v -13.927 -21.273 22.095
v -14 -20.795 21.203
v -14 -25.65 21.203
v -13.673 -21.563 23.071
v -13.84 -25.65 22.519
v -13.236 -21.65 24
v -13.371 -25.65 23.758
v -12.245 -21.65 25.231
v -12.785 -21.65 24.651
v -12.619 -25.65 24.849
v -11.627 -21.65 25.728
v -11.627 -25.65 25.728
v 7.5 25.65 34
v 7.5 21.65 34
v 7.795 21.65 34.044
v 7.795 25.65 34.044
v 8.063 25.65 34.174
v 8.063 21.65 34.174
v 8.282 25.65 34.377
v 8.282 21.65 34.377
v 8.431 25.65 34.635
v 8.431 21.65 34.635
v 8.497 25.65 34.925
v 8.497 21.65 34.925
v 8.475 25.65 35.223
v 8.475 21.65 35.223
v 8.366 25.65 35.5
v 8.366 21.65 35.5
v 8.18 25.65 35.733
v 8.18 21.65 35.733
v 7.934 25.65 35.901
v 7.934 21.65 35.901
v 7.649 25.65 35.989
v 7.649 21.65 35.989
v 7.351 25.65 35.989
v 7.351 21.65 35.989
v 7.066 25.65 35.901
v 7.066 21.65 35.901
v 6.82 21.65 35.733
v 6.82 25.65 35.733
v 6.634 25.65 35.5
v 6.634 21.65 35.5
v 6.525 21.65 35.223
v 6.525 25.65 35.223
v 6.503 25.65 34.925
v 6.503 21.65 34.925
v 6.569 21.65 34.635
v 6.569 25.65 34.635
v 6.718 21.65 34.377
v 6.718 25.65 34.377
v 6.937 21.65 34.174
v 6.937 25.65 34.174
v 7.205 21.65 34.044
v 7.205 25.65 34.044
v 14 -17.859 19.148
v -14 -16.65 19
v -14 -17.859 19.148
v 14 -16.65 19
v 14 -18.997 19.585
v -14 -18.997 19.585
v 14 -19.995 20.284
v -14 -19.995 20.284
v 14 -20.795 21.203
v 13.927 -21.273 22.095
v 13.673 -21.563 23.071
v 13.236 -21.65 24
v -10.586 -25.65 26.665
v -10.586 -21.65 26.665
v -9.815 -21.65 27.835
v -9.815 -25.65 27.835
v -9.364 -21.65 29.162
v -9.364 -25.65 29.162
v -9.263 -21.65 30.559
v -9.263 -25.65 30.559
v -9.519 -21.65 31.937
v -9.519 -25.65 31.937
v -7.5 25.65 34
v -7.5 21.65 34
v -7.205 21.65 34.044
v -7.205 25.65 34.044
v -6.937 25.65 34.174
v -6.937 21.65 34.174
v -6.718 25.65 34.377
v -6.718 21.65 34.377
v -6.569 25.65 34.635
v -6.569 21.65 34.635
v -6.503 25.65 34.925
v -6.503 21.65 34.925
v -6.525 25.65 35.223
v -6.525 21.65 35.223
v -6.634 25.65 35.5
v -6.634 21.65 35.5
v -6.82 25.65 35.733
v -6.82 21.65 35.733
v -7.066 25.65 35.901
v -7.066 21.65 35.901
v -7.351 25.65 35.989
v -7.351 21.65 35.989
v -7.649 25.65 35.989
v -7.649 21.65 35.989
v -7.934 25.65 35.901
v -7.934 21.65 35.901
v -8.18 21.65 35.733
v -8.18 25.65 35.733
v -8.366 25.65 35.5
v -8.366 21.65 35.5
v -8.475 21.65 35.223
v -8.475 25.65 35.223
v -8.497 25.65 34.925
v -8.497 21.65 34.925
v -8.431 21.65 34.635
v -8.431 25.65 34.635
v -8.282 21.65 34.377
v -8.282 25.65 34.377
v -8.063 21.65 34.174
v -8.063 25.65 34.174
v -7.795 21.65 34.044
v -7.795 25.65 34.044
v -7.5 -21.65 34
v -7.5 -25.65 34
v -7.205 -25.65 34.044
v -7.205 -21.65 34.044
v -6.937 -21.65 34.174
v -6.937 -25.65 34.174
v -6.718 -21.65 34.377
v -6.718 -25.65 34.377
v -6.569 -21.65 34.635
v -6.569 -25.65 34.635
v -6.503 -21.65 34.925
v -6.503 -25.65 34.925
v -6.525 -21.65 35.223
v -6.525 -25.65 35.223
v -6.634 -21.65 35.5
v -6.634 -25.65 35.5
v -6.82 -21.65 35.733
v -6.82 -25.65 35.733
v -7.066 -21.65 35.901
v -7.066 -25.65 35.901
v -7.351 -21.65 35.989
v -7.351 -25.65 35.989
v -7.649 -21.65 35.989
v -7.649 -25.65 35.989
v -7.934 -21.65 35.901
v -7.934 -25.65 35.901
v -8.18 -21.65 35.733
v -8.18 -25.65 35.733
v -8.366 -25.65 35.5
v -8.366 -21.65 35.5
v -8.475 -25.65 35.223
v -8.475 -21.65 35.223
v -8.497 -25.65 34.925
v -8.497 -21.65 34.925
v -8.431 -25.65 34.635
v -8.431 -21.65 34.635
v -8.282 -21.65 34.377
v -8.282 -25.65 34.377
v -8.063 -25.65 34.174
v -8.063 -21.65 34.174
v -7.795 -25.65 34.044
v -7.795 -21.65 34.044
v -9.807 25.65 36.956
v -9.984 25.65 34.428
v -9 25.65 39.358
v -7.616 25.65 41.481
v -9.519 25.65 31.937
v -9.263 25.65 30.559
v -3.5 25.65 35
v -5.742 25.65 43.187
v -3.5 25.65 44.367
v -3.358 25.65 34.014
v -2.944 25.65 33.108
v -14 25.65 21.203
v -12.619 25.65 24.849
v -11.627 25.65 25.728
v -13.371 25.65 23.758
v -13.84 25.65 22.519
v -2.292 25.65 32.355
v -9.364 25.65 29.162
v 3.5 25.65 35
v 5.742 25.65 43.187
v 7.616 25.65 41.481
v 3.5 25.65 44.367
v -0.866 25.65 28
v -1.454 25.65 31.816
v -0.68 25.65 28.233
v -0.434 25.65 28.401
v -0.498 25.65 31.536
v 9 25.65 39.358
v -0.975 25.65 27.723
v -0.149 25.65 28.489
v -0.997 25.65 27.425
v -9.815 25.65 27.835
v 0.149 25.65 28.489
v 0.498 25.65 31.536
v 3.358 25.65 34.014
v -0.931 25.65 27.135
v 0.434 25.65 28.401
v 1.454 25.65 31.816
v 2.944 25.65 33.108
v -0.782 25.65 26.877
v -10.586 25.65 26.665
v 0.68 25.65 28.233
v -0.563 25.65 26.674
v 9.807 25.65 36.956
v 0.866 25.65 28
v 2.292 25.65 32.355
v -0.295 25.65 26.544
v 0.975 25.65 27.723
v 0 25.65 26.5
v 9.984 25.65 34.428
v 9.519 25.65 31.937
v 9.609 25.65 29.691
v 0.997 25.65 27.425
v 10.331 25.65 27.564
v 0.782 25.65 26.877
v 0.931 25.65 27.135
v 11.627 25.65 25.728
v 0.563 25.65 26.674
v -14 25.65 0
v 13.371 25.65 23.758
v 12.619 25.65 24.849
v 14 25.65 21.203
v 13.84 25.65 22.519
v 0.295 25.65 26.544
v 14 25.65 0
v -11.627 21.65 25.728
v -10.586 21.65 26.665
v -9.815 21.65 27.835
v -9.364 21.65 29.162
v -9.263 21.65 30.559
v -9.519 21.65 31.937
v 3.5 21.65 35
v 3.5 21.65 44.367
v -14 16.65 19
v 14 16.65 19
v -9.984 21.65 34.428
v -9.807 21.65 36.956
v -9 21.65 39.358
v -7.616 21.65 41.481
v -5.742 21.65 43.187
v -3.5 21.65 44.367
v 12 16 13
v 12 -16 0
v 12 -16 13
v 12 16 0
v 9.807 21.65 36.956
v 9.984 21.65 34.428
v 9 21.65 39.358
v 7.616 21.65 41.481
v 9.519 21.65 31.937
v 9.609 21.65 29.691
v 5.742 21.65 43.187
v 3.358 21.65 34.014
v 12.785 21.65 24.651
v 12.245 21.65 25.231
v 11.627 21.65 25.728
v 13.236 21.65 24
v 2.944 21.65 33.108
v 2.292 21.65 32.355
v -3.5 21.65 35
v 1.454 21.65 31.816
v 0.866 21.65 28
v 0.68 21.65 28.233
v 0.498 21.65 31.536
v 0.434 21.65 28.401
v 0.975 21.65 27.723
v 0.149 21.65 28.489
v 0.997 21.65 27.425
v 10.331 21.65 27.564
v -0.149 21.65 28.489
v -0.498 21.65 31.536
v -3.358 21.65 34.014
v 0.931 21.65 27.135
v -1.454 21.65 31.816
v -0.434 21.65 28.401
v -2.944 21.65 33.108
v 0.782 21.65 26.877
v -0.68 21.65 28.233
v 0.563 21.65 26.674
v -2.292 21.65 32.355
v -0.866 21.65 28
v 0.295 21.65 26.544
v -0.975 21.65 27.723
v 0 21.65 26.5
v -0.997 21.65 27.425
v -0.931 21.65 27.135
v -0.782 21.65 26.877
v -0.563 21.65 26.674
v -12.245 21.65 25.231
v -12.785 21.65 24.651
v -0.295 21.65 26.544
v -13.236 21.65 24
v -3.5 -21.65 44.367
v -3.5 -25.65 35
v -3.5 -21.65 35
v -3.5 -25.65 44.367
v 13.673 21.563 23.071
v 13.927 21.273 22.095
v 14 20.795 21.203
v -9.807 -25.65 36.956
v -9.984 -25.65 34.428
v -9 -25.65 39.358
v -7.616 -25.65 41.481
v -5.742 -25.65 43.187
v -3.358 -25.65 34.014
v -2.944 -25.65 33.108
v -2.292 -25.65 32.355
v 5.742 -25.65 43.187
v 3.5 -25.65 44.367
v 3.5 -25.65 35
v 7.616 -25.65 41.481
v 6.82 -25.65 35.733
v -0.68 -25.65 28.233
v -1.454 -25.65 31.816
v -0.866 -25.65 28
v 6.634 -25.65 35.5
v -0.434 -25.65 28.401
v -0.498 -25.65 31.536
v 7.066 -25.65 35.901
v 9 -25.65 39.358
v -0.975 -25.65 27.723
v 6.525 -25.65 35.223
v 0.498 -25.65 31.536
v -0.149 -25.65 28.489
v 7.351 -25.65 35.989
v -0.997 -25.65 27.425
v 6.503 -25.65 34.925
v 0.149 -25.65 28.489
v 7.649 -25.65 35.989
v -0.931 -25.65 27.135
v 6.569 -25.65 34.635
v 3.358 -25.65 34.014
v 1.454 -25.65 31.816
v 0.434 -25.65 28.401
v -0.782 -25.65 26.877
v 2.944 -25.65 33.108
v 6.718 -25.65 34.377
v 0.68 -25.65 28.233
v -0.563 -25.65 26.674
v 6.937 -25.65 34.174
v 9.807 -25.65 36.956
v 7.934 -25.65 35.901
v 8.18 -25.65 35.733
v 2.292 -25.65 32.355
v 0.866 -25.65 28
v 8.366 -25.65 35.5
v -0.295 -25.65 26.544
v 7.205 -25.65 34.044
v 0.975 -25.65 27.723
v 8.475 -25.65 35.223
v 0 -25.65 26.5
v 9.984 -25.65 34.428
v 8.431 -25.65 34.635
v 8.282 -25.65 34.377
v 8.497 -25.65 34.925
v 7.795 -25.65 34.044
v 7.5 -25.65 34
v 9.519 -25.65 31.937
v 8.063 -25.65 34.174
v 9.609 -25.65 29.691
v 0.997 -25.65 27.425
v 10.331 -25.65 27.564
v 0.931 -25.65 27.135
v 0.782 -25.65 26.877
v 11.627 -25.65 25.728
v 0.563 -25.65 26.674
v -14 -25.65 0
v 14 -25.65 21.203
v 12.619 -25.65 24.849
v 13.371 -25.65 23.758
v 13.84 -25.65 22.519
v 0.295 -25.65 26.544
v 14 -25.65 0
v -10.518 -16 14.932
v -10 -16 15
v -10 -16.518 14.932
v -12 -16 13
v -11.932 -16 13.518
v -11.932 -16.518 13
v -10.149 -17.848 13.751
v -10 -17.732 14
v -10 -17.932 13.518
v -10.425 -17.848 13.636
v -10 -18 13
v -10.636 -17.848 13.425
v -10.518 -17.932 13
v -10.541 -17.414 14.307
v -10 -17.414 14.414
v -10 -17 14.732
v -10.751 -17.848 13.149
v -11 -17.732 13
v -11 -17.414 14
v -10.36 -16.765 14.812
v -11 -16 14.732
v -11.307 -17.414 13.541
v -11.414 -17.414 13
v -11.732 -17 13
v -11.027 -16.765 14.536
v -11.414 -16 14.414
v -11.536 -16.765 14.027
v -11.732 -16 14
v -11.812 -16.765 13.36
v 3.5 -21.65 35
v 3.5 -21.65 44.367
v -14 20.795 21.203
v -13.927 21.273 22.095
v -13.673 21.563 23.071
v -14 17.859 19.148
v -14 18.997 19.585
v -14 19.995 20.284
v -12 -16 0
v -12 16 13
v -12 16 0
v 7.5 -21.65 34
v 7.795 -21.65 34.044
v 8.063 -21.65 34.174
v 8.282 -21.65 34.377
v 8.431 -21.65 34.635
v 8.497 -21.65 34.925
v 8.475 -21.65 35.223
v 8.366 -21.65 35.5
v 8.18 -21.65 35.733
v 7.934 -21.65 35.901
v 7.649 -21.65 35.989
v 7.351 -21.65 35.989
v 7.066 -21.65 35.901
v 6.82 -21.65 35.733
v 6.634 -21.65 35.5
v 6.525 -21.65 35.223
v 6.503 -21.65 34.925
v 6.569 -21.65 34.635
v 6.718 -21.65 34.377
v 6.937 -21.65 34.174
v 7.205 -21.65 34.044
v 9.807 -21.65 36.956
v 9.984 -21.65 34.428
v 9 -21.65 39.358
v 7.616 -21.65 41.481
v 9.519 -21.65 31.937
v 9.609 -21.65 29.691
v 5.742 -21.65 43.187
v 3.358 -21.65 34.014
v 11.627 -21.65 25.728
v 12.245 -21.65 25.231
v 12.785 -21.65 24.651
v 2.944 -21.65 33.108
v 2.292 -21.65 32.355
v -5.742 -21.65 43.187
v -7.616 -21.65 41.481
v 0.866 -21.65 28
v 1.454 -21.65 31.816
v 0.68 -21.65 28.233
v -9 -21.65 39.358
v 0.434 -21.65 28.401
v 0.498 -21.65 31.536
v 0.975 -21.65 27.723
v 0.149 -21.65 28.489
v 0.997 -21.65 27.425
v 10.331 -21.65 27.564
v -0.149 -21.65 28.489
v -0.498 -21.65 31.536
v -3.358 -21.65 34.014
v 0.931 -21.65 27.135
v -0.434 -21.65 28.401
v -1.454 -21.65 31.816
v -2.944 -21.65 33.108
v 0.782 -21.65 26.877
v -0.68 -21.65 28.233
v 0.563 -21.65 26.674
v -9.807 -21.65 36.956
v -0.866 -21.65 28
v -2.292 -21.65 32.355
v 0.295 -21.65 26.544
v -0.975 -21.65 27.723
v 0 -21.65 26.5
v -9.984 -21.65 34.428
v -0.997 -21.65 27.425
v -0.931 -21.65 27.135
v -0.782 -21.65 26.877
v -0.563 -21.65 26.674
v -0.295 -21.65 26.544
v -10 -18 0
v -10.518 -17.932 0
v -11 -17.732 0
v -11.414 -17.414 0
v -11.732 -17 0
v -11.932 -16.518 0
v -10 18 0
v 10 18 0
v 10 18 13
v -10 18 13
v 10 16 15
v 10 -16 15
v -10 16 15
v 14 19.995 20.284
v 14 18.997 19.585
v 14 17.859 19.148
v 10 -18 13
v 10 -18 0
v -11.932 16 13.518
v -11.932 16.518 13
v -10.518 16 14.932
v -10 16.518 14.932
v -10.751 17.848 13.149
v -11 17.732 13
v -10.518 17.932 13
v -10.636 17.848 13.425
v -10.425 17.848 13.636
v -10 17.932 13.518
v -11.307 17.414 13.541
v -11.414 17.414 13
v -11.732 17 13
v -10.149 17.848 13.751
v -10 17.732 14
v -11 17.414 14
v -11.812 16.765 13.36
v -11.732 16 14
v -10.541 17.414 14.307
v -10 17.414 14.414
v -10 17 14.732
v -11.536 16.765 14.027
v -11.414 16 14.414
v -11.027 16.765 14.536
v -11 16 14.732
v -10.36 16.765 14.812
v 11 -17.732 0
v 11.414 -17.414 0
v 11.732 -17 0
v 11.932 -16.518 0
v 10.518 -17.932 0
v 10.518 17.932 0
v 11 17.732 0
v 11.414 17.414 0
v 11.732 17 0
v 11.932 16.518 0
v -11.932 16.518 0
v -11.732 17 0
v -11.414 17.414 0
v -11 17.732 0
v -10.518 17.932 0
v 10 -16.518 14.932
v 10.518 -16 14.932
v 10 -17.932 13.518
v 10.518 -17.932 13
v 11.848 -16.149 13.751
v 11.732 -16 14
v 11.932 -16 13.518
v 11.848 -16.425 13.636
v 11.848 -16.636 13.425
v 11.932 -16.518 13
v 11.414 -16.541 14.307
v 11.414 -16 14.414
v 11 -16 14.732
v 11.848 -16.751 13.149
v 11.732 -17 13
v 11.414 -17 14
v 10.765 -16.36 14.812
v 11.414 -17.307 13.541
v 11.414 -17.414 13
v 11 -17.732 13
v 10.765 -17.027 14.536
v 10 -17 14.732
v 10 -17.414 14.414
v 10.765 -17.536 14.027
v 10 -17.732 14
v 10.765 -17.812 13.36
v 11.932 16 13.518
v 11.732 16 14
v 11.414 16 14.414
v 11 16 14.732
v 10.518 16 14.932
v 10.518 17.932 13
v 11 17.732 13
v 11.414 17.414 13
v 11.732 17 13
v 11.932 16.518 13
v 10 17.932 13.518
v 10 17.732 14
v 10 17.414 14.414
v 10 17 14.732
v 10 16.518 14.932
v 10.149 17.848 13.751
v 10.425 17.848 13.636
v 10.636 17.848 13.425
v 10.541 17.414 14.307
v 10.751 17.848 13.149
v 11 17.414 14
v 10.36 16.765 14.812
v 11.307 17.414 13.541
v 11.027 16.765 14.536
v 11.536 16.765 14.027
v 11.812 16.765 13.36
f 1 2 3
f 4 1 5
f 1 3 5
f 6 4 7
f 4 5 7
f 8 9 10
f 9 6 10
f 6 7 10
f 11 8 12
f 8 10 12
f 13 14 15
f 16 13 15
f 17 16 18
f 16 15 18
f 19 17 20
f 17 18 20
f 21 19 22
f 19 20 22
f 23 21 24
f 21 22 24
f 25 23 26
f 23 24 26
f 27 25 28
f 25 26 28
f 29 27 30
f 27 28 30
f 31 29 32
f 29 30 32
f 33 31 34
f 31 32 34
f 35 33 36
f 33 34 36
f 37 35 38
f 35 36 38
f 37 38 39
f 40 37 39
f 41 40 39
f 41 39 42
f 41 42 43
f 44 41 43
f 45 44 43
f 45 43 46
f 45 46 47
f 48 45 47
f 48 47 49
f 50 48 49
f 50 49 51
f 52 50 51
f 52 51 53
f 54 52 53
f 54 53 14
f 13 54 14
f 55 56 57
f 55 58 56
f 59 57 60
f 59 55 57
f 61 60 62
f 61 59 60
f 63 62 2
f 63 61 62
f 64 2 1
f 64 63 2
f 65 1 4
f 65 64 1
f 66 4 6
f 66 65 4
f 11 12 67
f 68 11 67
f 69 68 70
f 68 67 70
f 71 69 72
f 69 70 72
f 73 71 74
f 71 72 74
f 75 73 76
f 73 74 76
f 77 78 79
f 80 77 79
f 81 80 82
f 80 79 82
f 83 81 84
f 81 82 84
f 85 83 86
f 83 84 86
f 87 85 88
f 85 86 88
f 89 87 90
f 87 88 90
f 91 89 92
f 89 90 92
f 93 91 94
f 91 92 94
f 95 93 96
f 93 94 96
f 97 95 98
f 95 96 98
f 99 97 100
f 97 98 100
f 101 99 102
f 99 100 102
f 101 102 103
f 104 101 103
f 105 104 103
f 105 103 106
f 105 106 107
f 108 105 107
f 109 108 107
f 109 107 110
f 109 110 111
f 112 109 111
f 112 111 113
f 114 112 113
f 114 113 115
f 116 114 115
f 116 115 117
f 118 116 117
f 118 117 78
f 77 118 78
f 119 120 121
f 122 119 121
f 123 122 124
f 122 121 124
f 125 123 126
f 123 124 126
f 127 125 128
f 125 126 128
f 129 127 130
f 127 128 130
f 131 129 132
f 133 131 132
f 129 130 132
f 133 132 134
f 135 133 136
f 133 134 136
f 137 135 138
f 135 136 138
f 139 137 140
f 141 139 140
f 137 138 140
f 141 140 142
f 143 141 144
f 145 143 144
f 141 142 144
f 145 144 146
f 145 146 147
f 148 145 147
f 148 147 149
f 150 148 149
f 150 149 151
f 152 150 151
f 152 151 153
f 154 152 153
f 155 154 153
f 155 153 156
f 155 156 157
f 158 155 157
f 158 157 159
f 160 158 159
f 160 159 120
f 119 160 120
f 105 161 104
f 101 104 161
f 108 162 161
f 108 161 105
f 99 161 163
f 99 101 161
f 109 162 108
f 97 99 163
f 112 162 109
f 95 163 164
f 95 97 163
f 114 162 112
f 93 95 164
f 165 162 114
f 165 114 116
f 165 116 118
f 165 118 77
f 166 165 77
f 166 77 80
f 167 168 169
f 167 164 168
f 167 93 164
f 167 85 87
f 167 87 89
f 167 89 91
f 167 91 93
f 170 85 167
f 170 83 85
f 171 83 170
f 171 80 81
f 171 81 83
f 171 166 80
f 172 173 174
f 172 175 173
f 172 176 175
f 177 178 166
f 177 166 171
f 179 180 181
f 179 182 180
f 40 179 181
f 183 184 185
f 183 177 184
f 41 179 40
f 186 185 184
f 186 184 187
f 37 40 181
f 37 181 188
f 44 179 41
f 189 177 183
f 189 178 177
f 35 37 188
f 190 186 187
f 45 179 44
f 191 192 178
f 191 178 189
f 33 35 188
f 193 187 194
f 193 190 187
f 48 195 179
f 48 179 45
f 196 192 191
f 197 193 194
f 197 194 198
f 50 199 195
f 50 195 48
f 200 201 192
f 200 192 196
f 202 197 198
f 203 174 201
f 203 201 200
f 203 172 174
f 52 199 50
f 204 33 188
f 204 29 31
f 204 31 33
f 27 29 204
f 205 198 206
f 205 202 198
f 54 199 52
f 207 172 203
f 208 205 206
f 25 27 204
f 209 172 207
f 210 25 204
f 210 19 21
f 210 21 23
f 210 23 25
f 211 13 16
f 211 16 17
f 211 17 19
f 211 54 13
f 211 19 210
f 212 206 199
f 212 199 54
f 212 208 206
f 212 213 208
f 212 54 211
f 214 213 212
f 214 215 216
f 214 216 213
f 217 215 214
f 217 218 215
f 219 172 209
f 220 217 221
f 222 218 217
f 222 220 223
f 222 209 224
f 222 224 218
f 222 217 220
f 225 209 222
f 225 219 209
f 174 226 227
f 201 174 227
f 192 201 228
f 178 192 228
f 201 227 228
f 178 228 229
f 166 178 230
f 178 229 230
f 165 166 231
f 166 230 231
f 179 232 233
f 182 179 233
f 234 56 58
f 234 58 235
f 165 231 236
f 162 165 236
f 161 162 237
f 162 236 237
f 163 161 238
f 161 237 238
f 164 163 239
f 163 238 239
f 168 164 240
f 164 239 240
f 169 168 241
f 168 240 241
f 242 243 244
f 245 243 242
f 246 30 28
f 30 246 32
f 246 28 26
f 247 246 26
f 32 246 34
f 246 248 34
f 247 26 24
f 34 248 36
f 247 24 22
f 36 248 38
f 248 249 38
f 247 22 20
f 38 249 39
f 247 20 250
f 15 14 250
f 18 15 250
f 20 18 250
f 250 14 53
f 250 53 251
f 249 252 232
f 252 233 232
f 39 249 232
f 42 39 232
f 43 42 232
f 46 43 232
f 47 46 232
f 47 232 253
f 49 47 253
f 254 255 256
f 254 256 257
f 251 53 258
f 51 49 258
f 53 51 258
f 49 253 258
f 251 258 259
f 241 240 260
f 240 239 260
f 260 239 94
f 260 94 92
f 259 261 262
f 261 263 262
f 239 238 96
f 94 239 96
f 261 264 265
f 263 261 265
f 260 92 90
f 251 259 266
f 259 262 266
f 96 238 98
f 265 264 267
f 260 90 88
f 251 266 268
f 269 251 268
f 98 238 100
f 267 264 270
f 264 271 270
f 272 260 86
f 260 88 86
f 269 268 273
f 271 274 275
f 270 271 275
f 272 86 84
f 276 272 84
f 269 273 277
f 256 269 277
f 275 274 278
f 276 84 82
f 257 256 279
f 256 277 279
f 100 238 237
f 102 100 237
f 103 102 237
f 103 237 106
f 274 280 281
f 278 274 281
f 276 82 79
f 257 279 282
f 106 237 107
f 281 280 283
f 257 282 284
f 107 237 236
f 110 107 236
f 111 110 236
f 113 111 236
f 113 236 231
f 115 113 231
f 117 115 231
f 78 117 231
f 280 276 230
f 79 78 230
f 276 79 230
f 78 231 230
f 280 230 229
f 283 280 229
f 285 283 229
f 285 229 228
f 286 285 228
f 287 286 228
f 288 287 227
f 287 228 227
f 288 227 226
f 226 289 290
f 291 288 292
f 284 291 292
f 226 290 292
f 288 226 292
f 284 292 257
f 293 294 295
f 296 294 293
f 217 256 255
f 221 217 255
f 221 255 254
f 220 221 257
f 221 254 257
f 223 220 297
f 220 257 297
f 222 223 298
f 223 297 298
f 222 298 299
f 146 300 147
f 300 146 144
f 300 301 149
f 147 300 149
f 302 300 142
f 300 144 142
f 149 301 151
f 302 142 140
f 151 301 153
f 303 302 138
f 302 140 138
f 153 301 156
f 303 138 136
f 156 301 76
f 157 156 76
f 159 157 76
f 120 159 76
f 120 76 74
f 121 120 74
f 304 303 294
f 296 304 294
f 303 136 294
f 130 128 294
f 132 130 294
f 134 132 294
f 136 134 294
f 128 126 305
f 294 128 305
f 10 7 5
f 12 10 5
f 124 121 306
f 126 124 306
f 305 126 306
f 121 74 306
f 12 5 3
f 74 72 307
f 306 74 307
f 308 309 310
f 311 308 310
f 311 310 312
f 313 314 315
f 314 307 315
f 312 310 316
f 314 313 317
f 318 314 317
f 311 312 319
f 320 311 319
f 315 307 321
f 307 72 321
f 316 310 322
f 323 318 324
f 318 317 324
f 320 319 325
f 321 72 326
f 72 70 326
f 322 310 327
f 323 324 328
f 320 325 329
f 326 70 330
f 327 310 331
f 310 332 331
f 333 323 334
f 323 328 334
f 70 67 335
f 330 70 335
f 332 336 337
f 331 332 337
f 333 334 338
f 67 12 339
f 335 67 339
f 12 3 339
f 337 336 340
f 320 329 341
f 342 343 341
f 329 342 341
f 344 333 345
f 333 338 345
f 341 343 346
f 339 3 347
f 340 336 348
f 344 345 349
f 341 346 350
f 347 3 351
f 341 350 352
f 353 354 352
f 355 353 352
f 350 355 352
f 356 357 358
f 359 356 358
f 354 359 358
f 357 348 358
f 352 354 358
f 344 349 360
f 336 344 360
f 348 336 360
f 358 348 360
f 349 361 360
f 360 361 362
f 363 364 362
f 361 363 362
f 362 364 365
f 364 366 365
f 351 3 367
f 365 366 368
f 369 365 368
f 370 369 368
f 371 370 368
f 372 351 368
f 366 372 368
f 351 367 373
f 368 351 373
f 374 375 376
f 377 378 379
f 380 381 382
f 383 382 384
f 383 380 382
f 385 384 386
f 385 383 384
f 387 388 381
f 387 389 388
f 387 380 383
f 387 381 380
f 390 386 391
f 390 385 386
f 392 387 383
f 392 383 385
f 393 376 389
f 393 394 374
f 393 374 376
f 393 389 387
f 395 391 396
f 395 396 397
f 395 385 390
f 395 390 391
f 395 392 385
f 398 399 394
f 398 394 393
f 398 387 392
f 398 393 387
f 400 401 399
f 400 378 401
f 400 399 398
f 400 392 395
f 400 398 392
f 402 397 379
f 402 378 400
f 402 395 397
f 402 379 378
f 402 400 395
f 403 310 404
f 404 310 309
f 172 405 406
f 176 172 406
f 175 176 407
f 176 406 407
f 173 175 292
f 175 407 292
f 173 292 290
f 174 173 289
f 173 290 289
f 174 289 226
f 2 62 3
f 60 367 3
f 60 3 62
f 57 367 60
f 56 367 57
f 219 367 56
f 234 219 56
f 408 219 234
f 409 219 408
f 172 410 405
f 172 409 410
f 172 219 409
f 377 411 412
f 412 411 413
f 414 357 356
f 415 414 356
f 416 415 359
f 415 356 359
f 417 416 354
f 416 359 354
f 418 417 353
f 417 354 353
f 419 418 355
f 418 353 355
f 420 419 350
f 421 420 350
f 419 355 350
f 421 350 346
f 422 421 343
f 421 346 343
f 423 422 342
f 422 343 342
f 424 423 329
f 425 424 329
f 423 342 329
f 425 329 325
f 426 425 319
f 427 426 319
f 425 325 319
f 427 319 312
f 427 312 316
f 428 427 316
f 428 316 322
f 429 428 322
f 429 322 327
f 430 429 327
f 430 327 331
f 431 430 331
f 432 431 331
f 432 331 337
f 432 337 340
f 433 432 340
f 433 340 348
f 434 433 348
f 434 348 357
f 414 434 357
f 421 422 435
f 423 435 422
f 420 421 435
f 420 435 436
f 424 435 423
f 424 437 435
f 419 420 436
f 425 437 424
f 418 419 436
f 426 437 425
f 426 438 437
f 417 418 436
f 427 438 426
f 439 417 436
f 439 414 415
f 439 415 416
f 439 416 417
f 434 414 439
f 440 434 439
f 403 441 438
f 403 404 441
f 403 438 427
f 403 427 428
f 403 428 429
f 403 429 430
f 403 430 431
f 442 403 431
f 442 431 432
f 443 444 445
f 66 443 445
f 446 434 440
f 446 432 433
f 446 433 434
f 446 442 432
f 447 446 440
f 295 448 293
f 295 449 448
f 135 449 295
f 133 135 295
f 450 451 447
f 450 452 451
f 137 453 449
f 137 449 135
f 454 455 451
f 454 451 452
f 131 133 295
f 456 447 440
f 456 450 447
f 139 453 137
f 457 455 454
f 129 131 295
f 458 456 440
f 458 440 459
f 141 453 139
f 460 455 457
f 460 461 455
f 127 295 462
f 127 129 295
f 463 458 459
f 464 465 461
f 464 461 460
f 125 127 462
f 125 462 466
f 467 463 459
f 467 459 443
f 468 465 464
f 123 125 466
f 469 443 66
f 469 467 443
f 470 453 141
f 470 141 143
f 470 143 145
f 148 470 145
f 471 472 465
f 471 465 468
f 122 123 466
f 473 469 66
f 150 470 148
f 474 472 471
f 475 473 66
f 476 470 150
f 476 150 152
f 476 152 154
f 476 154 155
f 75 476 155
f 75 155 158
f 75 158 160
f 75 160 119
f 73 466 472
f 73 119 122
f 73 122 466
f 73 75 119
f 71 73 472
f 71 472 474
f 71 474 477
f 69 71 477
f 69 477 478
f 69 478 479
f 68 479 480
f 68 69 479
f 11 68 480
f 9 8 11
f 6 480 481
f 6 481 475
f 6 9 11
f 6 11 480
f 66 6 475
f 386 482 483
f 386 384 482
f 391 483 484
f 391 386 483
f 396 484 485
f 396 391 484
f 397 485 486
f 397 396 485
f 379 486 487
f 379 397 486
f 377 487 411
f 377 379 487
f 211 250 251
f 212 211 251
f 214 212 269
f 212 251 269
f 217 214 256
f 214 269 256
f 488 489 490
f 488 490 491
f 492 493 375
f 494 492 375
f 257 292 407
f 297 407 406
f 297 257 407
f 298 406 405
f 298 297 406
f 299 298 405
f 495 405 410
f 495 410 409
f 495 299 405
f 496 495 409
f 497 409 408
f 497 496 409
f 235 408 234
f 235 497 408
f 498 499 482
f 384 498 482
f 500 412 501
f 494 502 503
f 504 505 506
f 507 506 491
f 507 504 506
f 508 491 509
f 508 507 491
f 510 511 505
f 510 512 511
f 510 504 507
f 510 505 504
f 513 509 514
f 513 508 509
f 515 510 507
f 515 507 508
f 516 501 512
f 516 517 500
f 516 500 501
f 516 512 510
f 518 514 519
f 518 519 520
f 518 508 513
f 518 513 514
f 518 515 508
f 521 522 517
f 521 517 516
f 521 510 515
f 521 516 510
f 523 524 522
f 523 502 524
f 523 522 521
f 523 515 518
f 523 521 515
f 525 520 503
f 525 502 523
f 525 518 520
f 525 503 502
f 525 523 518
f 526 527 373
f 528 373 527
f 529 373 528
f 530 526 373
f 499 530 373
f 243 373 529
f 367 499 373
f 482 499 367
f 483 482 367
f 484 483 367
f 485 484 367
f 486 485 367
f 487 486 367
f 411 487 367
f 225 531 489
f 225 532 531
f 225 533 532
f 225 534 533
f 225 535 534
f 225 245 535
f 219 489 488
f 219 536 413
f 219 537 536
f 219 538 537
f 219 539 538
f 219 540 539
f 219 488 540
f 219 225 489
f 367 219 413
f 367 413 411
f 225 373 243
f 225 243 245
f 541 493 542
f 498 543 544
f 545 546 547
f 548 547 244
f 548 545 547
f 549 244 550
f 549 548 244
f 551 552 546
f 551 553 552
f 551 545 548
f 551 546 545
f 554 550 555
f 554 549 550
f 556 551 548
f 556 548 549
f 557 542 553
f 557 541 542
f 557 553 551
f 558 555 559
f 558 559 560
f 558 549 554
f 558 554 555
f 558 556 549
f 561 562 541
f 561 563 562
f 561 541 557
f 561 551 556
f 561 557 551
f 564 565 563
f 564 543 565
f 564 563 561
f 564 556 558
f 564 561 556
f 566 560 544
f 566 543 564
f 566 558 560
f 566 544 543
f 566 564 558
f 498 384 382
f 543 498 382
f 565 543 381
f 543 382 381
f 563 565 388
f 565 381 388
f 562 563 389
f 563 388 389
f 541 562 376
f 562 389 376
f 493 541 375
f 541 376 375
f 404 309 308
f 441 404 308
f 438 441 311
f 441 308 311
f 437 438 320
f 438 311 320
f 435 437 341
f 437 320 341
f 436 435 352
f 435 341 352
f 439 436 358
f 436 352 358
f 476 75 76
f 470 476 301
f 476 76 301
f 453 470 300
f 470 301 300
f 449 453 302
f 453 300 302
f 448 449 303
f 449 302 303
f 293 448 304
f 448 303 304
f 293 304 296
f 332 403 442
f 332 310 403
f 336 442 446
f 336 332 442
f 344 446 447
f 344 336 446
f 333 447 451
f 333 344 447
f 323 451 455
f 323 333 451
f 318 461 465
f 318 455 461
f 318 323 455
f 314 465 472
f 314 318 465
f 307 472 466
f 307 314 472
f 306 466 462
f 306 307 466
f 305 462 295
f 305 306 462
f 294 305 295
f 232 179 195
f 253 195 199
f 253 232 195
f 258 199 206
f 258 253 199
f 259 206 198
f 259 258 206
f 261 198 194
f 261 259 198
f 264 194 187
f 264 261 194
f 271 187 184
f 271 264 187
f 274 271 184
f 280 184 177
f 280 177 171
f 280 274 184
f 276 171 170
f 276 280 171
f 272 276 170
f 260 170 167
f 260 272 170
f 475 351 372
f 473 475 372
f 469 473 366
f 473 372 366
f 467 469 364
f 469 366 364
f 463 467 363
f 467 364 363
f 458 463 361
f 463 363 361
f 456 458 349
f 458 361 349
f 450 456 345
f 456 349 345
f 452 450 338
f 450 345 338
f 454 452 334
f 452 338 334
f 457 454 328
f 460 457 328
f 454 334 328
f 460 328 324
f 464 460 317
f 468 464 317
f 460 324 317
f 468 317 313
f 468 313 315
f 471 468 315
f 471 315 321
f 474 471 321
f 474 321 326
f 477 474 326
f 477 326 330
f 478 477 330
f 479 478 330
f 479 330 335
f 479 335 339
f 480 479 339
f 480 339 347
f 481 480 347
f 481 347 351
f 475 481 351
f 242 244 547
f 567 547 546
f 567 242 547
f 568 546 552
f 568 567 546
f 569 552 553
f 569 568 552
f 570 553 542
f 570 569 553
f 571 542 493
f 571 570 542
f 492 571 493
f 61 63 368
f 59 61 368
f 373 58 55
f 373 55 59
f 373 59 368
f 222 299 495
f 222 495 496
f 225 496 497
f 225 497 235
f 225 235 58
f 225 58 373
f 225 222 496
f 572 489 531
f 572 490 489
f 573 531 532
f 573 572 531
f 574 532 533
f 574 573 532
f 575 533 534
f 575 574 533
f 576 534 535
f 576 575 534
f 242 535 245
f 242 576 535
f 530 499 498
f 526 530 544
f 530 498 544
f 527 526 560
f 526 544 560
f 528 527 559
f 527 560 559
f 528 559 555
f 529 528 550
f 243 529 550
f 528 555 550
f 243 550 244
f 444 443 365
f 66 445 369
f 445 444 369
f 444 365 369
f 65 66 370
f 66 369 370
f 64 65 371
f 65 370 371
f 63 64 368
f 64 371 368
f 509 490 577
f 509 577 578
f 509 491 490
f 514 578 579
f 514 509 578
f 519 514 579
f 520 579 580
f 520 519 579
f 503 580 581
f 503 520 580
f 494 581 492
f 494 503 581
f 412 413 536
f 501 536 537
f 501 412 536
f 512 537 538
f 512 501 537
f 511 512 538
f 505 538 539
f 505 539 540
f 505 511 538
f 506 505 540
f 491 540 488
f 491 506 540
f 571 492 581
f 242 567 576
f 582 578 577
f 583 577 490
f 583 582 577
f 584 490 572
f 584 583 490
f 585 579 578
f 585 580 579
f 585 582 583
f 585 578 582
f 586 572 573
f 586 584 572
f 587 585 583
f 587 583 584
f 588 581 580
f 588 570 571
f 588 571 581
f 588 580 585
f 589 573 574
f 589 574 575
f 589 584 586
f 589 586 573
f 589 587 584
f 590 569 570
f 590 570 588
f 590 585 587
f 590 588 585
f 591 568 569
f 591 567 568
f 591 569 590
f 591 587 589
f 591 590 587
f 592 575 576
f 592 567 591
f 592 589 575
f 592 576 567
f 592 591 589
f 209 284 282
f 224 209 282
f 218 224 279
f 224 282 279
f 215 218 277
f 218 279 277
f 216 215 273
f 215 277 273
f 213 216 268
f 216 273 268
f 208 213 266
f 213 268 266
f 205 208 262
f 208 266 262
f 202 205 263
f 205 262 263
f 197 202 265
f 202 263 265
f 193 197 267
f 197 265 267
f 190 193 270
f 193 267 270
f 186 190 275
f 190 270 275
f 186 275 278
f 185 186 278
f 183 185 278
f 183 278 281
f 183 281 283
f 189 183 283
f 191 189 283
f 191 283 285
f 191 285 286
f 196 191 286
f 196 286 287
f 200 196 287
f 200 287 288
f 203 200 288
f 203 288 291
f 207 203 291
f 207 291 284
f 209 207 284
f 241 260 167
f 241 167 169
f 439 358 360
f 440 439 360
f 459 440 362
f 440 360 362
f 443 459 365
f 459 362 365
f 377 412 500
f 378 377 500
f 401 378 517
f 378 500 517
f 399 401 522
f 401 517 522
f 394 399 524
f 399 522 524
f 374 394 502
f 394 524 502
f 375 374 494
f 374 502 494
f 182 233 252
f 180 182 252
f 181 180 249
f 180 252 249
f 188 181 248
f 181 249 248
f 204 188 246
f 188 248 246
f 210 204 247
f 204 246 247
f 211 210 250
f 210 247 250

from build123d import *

# Parameters (mm, degrees)
ESQUISSE3_R                  = 3.5
BOSS_EXTRU_1_DEPTH           = 25.65
ENL_V_MAT_EXTRU_2_DEPTH      = 58.051928101
ENL_V_MAT_EXTRU_2_DEPTH_BACK = 58.051928101
ESQUISSE5_W                  = 30
ESQUISSE5_H                  = 43.3
ENL_V_MAT_EXTRU_6_DEPTH      = 73.309681233
ESQUISSE20_W                 = 7
ESQUISSE20_H                 = 11.521668881
ENL_V_MAT_EXTRU_12_DEPTH     = 70.661251783
ESQUISSE22_R                 = 1
ENL_V_MAT_EXTRU_14_DEPTH     = 70.254348527
CONG_2_R                     = 5
ESQUISSE23_W                 = 24
ESQUISSE23_H                 = 36
ENL_V_MAT_EXTRU_15_DEPTH     = 15
CONG_3_R                     = 2


with BuildPart() as part:
    # Esquisse3 → Boss.-Extru.1 (new, symmetric)
    with BuildSketch(Plane(origin=(0, 0, 0), x_dir=(1, 0, 0), z_dir=(0, 1, 0))):
        with BuildLine():
            Line((-14, 0), (-14, -35))
            ThreePointArc((-14, -35), (0, -49), (14, -35))
            Line((14, -35), (14, 0))
            Line((14, 0), (-14, 0))
        make_face()
        with Locations(Location((0, -35, 0), (0, 0, 270))):
            Circle(ESQUISSE3_R, mode=Mode.SUBTRACT)
    extrude(amount=BOSS_EXTRU_1_DEPTH, both=True)

    # Esquisse5 → Enlèv. mat.-Extru.2 (cut, two sides: drawn at the far end of the back side and taken through both)
    with BuildSketch(Plane(origin=(0, 0, 0), x_dir=(0, 0, -1), z_dir=(1, 0, 0)).offset(-ENL_V_MAT_EXTRU_2_DEPTH_BACK)):
        with Locations((-34, 0)):
            Rectangle(ESQUISSE5_W, ESQUISSE5_H)
    extrude(amount=ENL_V_MAT_EXTRU_2_DEPTH + ENL_V_MAT_EXTRU_2_DEPTH_BACK, mode=Mode.SUBTRACT)

    # Esquisse11 → Enlèv. mat.-Extru.6 (cut, through all)
    with BuildSketch(Plane.XZ.offset(25.65)):
        with BuildLine():
            Line((14, 21.20346537), (14, 35))
            ThreePointArc((14, 35), (0, 49), (-14, 35))
            Line((-14, 35), (-14, 21.20346537))
            ThreePointArc((-14, 21.20346537), (-13.370879839, 23.757781245), (-11.627443785, 25.727743806))
            ThreePointArc((-11.627443785, 25.727743806), (-9.546893091, 28.483748084), (-9.519282304, 31.936788544))
            ThreePointArc((-9.519282304, 31.936788544), (0, 45), (9.519282304, 31.936788544))
            ThreePointArc((9.519282304, 31.936788544), (9.893665279, 28.601487898), (11.627443785, 25.727743806))
            ThreePointArc((11.627443785, 25.727743806), (13.370879839, 23.757781245), (14, 21.20346537))
        make_face()
    extrude(amount=-ENL_V_MAT_EXTRU_6_DEPTH, mode=Mode.SUBTRACT)

    # Esquisse20 → Enlèv. mat.-Extru.12 (cut, through all)
    with BuildSketch(Plane.XZ.offset(25.65)):
        with Locations((0, 40.760834441)):
            Rectangle(ESQUISSE20_W, ESQUISSE20_H)
    extrude(amount=-ENL_V_MAT_EXTRU_12_DEPTH, mode=Mode.SUBTRACT)

    # Esquisse22 → Enlèv. mat.-Extru.14 (cut, through all)
    with BuildSketch(Plane.XZ.offset(25.65)):
        with Locations(Location((0, 27.5, 0), (0, 0, 270))):
            Circle(ESQUISSE22_R)
        with Locations(Location((-7.5, 35, 0), (0, 0, 270))):
            Circle(ESQUISSE22_R)
        with Locations((0, 42.5)):
            Circle(ESQUISSE22_R)
        with Locations(Location((7.5, 35, 0), (0, 0, 270))):
            Circle(ESQUISSE22_R)
    extrude(amount=-ENL_V_MAT_EXTRU_14_DEPTH, mode=Mode.SUBTRACT)

    # Congé2
    cong_2_edges = [part.edges().sort_by_distance(p)[0] for p in [
        (0, -21.65, 19),
        (0, 21.65, 19),
    ]]
    fillet(cong_2_edges, radius=CONG_2_R)

    # Esquisse23 → Enlèv. mat.-Extru.15 (cut)
    with BuildSketch(Plane(origin=(0, 0, 0), x_dir=(-1, 0, 0), z_dir=(0, 0, -1))):
        Rectangle(ESQUISSE23_W, ESQUISSE23_H)
    extrude(amount=-ENL_V_MAT_EXTRU_15_DEPTH, mode=Mode.SUBTRACT)

    # Congé3
    cong_3_edges = [part.edges().sort_by_distance(p)[0] for p in [
        (-12, 0, 15),
        (-12, 18, 7.5),
        (0, -18, 15),
        (-12, -18, 7.5),
        (12, 0, 15),
        (12, -18, 7.5),
        (0, 18, 15),
        (12, 18, 7.5),
    ]]
    fillet(cong_3_edges, radius=CONG_3_R)


solid = part.part
